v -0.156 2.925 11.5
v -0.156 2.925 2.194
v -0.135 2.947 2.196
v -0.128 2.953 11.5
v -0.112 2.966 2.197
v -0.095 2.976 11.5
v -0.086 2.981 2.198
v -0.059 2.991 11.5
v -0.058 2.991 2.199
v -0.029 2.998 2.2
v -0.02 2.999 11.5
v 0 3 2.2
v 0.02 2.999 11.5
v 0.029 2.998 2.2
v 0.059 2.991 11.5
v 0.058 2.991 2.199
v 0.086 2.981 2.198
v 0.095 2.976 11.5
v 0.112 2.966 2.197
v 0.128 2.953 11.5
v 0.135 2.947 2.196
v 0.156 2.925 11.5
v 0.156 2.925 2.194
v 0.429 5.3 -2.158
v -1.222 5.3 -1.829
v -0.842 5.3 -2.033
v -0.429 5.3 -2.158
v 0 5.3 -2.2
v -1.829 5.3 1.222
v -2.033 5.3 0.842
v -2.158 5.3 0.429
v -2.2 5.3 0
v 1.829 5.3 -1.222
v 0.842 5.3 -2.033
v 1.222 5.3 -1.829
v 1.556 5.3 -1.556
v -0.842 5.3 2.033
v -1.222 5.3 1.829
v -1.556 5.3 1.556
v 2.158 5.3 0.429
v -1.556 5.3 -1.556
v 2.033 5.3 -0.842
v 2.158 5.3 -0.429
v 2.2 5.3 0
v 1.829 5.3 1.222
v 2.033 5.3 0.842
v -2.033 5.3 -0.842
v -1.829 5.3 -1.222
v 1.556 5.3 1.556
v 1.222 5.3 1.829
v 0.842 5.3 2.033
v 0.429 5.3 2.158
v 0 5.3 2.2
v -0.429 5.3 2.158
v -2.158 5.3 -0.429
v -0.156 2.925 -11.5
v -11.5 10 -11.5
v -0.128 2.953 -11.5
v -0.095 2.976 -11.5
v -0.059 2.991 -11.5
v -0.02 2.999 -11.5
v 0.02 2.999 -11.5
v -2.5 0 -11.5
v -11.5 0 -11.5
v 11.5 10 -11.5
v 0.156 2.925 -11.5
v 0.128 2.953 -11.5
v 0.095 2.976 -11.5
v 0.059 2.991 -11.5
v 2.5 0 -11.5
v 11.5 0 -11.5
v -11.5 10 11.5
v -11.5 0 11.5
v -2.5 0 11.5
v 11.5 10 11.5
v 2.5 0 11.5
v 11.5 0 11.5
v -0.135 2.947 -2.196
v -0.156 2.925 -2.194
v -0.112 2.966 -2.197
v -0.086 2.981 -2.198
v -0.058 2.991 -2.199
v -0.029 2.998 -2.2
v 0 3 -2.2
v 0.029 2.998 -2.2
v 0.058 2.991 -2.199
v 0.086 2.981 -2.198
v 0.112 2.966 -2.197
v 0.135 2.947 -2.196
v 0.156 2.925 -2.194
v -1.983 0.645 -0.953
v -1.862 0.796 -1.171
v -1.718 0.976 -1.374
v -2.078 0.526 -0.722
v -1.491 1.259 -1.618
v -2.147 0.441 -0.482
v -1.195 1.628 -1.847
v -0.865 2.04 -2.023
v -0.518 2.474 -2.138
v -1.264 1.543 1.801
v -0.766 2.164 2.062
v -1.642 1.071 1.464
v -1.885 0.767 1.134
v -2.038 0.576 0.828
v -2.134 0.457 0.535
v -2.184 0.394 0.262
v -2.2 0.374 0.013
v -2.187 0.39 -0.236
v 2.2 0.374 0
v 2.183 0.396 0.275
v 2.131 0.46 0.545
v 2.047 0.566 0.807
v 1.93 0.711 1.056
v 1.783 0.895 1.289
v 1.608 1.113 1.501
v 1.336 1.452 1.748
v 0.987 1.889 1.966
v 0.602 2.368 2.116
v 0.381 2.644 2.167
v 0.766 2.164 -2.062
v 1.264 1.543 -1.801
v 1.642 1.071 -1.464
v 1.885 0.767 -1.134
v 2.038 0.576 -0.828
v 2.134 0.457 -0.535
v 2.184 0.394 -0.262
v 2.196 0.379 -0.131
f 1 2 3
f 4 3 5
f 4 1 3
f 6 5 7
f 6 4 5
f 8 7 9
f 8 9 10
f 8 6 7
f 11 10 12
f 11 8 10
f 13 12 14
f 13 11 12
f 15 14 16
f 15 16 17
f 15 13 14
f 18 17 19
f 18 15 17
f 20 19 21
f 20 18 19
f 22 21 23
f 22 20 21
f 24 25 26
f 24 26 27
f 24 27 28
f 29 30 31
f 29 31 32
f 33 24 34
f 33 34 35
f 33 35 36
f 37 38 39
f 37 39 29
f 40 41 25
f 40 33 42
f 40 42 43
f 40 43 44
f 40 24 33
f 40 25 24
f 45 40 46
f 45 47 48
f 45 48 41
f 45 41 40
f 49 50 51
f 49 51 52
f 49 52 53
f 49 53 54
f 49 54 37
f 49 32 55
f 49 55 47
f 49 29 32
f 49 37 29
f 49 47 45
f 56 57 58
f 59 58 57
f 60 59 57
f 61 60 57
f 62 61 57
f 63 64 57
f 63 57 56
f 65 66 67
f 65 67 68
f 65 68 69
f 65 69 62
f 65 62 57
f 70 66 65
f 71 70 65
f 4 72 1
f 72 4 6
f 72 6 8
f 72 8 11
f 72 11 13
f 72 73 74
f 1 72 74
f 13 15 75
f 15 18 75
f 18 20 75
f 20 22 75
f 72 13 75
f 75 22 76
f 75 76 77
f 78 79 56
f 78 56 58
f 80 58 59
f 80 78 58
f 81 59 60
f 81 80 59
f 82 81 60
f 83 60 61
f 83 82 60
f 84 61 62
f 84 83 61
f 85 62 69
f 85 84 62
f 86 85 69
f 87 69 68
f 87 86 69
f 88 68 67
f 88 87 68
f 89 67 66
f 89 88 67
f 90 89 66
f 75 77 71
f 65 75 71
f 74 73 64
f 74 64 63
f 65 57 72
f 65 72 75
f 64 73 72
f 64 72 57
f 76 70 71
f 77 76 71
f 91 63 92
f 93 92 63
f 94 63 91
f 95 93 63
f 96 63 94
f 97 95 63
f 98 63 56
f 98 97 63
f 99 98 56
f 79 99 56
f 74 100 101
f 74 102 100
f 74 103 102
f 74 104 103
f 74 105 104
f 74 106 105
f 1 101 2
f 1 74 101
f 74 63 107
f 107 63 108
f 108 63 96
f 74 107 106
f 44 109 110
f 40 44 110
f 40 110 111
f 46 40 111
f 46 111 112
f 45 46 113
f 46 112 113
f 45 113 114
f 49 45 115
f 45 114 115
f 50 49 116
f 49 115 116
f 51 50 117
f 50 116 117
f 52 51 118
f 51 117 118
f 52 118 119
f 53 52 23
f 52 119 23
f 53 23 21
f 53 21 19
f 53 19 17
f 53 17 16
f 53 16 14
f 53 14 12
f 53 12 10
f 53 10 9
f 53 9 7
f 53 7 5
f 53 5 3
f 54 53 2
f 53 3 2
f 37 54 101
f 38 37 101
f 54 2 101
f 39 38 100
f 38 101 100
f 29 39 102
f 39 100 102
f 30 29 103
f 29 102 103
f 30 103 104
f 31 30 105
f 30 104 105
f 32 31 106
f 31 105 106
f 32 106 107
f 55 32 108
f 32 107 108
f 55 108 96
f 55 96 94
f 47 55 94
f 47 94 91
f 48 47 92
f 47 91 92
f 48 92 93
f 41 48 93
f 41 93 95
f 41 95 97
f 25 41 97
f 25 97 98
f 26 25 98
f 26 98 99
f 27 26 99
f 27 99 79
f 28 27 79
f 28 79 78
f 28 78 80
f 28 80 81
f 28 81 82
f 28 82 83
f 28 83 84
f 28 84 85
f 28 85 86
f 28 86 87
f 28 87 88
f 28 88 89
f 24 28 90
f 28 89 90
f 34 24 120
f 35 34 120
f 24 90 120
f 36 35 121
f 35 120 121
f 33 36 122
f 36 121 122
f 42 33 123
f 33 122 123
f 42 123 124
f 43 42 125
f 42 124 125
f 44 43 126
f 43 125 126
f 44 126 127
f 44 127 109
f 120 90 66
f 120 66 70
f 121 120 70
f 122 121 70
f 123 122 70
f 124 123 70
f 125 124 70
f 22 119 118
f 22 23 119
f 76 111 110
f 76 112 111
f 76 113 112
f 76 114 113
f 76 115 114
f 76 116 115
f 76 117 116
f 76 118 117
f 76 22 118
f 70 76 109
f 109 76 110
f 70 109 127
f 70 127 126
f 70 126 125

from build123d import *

# Parameters (mm, degrees)
SKETCH1_W           = 23
SKETCH1_H           = 23
BOSS_EXTRUDE1_DEPTH = 10
CUT_EXTRUDE1_DEPTH  = 24
SKETCH3_R           = 2.2
CUT_EXTRUDE2_DEPTH  = 5.3


with BuildPart() as part:
    # Sketch1 → Boss-Extrude1 (new body)
    with BuildSketch(Plane(origin=(0, 0, 0), x_dir=(1, 0, 0), z_dir=(0, 1, 0))):
        Rectangle(SKETCH1_W, SKETCH1_H)
    extrude(amount=BOSS_EXTRUDE1_DEPTH)

    # Sketch2 → Cut-Extrude1 (cut, through all)
    with BuildSketch(Plane.XY.offset(11.5)):
        with BuildLine():
            Line((-2.5, 0), (-0.15607285, 2.925065045))
            ThreePointArc((-0.15607285, 2.925065045), (0, 3), (0.15607285, 2.925065045))
            Line((0.15607285, 2.925065045), (2.5, 0))
            Line((2.5, 0), (-2.5, 0))
        make_face()
    extrude(amount=-CUT_EXTRUDE1_DEPTH, mode=Mode.SUBTRACT)

    # Sketch3 → Cut-Extrude2 (cut)
    with BuildSketch(Plane.XZ):
        Circle(SKETCH3_R)
    extrude(amount=-CUT_EXTRUDE2_DEPTH, mode=Mode.SUBTRACT)


solid = part.part
